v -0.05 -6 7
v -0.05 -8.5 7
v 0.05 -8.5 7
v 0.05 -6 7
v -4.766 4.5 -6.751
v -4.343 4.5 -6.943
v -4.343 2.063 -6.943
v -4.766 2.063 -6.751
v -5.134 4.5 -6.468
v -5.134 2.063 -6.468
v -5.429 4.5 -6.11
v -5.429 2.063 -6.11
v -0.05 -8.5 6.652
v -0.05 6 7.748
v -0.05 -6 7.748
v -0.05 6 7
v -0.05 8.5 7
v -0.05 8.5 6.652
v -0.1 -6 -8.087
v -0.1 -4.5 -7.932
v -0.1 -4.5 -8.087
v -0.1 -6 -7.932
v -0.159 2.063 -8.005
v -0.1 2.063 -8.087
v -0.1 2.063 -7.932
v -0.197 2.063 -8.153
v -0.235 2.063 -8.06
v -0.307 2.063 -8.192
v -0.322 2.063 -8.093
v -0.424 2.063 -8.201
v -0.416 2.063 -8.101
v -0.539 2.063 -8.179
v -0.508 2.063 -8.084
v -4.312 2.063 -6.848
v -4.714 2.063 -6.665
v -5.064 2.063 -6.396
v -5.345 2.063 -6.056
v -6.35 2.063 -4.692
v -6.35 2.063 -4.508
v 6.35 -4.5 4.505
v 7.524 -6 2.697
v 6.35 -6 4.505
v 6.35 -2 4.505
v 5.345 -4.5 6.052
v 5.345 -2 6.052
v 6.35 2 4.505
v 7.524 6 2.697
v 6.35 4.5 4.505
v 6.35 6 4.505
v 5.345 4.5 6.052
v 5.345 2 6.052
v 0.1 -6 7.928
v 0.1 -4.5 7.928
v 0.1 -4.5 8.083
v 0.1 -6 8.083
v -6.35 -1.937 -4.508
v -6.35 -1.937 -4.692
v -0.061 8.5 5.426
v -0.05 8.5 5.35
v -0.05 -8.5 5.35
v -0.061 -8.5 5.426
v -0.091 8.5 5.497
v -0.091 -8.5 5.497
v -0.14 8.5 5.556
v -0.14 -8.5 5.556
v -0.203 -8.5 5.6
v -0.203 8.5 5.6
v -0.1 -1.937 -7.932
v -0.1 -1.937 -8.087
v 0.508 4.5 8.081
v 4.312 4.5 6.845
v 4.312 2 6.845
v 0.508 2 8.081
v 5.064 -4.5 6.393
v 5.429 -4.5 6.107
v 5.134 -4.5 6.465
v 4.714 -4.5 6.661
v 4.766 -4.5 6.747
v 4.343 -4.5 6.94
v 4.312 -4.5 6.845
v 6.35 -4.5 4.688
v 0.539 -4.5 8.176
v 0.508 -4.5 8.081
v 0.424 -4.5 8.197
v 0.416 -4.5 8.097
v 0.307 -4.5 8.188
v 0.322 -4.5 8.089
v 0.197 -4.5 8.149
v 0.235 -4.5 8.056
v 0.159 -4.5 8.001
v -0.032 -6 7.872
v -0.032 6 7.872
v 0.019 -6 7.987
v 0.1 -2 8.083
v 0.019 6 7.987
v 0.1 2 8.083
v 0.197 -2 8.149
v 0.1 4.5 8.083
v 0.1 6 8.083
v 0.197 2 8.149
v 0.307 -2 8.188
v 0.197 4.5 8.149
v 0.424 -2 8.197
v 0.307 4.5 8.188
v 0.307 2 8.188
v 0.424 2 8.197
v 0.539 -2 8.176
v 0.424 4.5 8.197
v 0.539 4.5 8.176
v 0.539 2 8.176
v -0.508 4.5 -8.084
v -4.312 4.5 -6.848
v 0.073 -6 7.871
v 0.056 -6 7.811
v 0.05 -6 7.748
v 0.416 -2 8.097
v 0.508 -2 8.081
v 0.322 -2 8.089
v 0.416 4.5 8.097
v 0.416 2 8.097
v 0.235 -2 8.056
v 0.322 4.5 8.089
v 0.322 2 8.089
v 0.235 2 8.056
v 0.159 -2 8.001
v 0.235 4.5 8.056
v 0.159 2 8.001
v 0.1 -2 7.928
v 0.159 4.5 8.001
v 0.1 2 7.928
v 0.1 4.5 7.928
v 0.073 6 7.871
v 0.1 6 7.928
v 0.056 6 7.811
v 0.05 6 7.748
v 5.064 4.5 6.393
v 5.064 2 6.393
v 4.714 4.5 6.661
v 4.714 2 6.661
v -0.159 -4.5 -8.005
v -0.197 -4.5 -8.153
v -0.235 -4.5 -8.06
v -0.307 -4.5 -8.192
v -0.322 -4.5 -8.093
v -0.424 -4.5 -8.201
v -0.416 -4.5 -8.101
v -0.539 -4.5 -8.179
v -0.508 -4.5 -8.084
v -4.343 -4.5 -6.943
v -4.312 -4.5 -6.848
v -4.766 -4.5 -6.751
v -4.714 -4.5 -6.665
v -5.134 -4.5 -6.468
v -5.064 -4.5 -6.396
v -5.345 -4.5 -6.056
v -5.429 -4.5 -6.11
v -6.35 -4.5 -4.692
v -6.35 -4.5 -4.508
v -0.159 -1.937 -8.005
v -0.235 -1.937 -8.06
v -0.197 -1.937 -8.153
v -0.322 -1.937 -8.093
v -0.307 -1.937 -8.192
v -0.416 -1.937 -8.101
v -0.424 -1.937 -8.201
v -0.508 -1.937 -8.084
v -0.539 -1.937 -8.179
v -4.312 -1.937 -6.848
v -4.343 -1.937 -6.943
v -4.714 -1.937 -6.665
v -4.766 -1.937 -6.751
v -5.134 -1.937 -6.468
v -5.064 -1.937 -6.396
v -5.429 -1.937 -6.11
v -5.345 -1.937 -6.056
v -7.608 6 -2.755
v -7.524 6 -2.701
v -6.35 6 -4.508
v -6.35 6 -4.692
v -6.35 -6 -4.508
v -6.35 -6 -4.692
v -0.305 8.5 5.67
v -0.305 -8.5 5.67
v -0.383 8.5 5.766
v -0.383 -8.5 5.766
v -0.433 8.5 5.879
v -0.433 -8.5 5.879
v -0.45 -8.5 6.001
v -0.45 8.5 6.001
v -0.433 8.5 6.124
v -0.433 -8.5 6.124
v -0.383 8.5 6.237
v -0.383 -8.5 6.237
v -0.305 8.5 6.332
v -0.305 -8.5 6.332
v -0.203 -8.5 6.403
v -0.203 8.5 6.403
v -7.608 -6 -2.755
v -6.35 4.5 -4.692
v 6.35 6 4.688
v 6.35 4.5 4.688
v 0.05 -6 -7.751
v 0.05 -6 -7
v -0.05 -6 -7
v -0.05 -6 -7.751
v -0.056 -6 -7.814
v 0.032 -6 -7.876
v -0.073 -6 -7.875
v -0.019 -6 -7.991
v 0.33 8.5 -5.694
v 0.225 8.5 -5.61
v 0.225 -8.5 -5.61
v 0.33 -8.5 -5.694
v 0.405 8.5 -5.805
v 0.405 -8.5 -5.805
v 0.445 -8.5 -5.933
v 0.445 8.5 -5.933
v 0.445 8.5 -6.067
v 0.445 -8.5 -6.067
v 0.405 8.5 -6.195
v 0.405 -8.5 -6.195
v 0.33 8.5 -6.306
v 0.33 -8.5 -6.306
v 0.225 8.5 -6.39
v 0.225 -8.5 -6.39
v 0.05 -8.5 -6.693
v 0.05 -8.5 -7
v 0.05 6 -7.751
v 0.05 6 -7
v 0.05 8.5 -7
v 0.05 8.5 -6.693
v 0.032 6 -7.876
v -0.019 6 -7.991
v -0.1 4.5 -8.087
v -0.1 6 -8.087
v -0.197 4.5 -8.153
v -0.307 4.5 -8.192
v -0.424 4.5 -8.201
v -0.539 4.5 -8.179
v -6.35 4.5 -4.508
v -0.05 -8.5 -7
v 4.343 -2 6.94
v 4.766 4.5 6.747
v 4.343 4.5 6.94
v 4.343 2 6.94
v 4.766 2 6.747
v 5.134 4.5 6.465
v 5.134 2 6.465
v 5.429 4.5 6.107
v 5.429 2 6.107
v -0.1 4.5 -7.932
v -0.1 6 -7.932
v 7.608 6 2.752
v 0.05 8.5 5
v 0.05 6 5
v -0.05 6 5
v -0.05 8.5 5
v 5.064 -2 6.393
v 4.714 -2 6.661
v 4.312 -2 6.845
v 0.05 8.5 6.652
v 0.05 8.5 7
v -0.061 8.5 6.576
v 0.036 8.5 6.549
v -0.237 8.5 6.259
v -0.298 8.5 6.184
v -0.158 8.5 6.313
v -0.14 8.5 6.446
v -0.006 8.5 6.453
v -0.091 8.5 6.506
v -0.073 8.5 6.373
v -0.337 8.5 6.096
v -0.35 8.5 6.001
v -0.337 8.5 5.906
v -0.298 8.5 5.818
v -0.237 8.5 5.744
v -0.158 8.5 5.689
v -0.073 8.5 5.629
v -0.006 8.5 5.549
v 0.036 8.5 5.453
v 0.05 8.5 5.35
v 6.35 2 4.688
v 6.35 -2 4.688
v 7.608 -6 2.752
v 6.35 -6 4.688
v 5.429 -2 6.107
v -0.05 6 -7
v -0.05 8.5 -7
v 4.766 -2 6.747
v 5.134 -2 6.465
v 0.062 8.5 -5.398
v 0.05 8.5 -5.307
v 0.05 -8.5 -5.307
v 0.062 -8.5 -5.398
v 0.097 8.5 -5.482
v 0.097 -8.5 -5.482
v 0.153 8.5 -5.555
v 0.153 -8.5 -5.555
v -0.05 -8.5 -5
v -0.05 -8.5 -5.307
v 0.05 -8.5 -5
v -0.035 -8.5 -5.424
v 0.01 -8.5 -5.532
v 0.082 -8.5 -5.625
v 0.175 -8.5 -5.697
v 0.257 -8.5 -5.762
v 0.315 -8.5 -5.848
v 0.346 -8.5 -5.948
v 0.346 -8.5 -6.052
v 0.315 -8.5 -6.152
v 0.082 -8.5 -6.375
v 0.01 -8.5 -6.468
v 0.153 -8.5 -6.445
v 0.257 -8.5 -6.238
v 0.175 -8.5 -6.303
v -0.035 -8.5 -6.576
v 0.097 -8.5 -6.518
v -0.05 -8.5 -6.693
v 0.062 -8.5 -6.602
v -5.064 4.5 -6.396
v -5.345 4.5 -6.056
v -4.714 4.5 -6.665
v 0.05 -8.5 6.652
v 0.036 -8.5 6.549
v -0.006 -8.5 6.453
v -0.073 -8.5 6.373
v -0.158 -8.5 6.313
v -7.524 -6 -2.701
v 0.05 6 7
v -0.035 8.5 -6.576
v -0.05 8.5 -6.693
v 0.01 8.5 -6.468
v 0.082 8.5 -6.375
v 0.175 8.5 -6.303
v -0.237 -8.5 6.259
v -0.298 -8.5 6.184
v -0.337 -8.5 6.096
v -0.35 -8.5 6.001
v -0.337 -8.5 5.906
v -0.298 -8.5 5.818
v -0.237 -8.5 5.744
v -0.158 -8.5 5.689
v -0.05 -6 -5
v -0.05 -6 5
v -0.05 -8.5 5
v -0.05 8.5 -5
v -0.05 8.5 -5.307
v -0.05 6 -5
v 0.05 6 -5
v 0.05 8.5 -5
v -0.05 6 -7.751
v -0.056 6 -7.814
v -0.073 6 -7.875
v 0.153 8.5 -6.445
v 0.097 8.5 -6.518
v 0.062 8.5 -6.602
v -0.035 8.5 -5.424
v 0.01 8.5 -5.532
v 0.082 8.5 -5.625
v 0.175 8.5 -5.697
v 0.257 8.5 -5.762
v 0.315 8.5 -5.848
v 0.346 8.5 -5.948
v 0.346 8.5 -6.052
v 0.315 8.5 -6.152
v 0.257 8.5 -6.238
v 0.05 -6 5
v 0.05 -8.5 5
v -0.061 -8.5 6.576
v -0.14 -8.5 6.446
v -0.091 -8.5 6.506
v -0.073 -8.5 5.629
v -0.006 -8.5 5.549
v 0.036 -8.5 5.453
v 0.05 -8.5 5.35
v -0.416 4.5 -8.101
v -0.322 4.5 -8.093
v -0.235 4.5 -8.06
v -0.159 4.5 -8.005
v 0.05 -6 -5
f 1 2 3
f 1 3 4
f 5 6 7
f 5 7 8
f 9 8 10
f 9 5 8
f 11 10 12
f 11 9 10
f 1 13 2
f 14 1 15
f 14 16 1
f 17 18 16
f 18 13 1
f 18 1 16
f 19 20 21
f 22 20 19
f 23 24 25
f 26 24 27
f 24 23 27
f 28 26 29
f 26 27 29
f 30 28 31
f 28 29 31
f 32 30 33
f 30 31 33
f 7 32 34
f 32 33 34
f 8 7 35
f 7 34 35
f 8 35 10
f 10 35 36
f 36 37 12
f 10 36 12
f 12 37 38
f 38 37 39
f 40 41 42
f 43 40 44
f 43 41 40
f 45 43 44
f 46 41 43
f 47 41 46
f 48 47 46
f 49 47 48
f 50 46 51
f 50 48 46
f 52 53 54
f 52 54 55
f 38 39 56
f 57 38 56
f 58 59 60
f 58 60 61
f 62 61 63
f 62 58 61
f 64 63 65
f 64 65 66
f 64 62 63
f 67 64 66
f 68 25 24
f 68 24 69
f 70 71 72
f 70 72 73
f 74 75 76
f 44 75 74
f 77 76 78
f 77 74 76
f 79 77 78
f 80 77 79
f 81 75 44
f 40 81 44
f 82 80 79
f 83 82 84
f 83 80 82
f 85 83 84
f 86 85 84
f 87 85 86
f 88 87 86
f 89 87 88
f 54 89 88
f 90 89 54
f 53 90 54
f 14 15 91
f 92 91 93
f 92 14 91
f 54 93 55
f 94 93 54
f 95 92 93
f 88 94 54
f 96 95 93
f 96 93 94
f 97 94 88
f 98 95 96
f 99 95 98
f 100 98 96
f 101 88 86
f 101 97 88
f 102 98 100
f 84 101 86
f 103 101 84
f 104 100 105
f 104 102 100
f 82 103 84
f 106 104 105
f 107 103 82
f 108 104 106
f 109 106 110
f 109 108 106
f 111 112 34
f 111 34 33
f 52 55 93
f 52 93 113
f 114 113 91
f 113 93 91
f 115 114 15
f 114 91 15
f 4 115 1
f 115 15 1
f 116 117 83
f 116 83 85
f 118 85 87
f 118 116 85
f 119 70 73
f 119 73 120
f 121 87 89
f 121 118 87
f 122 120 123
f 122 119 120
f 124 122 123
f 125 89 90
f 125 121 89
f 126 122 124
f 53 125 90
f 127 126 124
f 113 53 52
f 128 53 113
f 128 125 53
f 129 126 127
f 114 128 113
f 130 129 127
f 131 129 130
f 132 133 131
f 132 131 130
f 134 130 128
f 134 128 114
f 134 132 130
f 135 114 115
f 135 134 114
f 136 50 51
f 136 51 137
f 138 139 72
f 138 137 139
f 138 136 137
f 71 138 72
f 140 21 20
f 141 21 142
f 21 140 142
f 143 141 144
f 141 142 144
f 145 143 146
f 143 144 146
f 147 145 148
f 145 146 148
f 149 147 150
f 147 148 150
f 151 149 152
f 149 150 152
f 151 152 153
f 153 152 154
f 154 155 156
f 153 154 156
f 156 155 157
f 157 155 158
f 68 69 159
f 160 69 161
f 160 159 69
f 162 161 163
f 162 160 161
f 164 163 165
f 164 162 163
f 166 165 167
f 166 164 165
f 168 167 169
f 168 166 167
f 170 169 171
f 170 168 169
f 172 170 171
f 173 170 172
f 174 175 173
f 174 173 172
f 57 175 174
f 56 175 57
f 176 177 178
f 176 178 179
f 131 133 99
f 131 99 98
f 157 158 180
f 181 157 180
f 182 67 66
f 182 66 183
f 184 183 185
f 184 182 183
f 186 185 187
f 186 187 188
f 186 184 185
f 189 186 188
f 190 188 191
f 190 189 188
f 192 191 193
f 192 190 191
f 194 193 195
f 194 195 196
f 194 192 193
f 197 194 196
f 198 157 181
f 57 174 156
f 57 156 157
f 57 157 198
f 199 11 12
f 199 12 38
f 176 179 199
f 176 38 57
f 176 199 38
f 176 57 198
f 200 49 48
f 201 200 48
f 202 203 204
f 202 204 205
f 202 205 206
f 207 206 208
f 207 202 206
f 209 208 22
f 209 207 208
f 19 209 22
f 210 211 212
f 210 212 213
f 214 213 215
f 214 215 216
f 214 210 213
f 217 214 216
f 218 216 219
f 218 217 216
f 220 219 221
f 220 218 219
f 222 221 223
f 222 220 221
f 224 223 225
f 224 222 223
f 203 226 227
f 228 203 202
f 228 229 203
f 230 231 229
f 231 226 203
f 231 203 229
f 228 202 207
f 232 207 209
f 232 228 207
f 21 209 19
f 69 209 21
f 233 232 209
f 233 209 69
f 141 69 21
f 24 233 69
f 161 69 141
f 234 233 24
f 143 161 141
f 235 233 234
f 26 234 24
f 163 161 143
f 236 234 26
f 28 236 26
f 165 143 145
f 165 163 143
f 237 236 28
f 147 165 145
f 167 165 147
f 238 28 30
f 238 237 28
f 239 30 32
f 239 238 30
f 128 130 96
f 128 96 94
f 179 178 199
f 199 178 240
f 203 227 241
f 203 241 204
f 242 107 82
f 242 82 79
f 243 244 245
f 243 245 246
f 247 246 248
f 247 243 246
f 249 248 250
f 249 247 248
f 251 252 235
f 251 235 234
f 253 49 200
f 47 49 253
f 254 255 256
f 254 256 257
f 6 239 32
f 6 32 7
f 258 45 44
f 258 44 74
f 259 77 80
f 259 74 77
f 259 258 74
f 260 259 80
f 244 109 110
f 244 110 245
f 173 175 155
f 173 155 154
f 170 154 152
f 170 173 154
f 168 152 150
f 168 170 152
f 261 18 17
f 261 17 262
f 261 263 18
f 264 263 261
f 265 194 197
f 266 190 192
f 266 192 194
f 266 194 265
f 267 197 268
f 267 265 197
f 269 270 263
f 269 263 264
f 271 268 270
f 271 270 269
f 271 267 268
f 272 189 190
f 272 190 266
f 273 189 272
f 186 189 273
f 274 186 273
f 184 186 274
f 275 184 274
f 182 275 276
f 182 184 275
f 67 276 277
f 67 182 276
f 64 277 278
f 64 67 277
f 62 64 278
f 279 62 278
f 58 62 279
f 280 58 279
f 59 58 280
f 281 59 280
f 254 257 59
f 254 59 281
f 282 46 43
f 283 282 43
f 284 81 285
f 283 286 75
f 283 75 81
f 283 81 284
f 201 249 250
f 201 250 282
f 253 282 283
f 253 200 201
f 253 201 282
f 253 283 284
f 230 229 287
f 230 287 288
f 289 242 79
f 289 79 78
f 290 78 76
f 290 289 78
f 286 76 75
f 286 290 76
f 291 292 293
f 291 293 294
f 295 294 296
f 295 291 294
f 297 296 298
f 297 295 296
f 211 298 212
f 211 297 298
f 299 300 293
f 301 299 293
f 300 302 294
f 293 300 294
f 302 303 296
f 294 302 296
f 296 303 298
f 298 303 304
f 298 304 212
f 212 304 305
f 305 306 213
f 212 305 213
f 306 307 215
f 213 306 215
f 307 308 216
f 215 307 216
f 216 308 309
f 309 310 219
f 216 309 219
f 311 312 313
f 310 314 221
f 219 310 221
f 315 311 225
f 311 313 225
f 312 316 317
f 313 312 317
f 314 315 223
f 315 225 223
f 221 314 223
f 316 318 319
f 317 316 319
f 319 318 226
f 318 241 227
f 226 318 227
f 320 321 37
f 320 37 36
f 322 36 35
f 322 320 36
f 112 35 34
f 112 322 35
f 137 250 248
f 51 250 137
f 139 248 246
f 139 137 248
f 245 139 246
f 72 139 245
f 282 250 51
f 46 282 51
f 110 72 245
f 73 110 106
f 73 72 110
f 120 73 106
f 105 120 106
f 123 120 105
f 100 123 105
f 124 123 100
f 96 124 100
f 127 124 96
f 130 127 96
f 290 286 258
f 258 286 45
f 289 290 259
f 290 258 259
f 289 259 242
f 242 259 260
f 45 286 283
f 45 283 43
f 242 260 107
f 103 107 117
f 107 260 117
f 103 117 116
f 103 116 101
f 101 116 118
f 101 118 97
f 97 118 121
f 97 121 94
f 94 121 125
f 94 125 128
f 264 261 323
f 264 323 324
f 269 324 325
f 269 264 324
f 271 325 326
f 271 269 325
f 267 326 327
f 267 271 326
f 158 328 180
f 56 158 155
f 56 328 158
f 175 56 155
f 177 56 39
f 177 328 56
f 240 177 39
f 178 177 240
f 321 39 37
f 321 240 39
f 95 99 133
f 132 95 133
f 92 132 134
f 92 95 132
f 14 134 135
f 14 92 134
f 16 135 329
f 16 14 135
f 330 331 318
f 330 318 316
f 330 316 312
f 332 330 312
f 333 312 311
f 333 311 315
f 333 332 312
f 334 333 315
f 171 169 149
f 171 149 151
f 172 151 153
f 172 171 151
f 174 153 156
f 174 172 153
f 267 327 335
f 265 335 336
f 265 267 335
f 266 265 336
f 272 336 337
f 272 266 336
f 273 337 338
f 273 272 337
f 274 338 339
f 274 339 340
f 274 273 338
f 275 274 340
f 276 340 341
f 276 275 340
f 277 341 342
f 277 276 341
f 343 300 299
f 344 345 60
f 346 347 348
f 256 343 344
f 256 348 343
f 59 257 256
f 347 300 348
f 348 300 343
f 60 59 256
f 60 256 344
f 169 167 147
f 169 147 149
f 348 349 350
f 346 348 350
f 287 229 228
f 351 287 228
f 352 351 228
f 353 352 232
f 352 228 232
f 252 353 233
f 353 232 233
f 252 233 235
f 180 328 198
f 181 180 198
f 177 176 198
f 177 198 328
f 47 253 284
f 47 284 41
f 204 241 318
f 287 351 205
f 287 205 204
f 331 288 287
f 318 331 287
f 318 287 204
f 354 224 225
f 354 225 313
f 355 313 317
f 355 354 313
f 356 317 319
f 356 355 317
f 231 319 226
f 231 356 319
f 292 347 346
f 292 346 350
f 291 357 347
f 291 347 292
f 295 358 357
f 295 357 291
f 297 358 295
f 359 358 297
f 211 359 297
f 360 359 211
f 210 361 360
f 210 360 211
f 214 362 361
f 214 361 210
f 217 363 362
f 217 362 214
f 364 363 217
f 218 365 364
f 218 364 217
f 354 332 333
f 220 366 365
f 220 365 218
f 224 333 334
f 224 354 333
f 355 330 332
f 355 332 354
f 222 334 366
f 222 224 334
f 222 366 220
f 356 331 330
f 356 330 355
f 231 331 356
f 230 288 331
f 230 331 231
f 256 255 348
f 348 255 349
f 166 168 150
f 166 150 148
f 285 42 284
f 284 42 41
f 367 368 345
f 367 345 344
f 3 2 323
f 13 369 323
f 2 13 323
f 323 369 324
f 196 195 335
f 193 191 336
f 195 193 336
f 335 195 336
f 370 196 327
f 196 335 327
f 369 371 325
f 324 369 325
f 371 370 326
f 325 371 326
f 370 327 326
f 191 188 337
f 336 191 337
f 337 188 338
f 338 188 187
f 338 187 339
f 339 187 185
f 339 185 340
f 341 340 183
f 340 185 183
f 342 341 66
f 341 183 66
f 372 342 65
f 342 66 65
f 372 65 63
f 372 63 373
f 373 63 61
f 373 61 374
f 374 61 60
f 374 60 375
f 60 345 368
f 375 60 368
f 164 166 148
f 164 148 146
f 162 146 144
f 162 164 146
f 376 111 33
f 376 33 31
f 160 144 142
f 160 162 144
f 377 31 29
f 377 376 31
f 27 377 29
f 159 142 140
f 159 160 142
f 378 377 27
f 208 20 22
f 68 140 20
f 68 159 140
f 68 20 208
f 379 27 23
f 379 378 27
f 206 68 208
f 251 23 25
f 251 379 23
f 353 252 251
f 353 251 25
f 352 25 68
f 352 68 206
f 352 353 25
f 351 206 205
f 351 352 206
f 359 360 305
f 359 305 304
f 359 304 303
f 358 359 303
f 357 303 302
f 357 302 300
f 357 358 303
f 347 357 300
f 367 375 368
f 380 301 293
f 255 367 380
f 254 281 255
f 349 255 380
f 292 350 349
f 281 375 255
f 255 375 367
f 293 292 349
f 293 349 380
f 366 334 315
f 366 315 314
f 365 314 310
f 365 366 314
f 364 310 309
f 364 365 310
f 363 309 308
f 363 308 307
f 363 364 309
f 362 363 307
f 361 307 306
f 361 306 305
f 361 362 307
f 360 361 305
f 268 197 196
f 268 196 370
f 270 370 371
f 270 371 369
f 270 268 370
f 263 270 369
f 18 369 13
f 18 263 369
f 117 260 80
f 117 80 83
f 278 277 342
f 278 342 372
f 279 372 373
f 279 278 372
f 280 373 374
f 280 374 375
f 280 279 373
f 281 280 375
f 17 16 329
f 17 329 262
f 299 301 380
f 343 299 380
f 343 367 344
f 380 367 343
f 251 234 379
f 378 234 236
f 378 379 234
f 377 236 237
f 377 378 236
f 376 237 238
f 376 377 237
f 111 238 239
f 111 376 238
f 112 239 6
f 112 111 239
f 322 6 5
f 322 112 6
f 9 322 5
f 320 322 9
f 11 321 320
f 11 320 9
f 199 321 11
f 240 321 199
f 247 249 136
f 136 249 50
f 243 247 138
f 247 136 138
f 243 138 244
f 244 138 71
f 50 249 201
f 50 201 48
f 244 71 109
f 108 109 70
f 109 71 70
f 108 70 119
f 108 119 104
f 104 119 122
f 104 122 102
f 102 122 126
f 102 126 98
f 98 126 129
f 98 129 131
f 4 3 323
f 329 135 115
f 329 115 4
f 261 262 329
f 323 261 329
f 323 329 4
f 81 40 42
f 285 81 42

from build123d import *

# Parameters (mm, degrees)
EXTRUDE_THIN1_DEPTH      = 8.5
EXTRUDE_THIN1_DEPTH_BACK = 8.5
SKETCH2_W                = 10
SKETCH2_H                = 2.5
SKETCH2_W_2              = 2.5
EXTRUDE1_DEPTH           = 10
EXTRUDE1_DEPTH_BACK      = 10
SKETCH3_W                = 6.25
SKETCH3_H                = 4
EXTRUDE2_DEPTH           = 10
SKETCH4_W                = 6.25
SKETCH4_H                = 4
EXTRUDE3_DEPTH           = 10


with BuildPart() as part:
    # Sketch1 → Extrude-Thin1 (new body, two sides)
    with BuildSketch(Plane(origin=(0, 0, 0), x_dir=(1, 0, 0), z_dir=(0, 1, 0))) as extrude_thin1_sk:
        with BuildLine():
            Line((7.523762622, -2.697363846), (5.345206482, -6.052046118))
            ThreePointArc((5.345206482, -6.052046118), (4.896883661, -6.537039014), (4.312382013, -6.844560207))
            Line((4.312382013, -6.844560207), (0.508155948, -8.080628184))
            ThreePointArc((0.508155948, -8.080628184), (0.194275162, -8.030914352), (0.05, -7.747758404))
            Line((0.05, -7.747758404), (0.05, -6.652305648))
            ThreePointArc((0.05, -6.652305648), (-0.006212483, -6.453404557), (-0.158219178, -6.313349383))
            ThreePointArc((-0.158219178, -6.313349383), (-0.35, -6.001152824), (-0.158219178, -5.688956264))
            ThreePointArc((-0.158219178, -5.688956264), (-0.006212483, -5.548901091), (0.05, -5.35))
            Line((0.05, -5.35), (0.05, 5.307179677))
            ThreePointArc((0.05, 5.307179677), (0.096891109, 5.482179677), (0.225, 5.610288568))
            ThreePointArc((0.225, 5.610288568), (0.45, 6), (0.225, 6.389711432))
            ThreePointArc((0.225, 6.389711432), (0.096891109, 6.517820323), (0.05, 6.692820323))
            Line((0.05, 6.692820323), (0.05, 7.751254615))
            ThreePointArc((0.05, 7.751254615), (-0.135496636, 8.115312262), (-0.539057647, 8.179230047))
            Line((-0.539057647, 8.179230047), (-4.343283713, 6.943162069))
            ThreePointArc((-4.343283713, 6.943162069), (-4.957759804, 6.619870559), (-5.429073538, 6.110006233))
            Line((-5.429073538, 6.110006233), (-7.607629679, 2.755323961))
            Line((-7.607629679, 2.755323961), (-7.523762622, 2.700860058))
            Line((-7.523762622, 2.700860058), (-5.345206482, 6.055542329))
            ThreePointArc((-5.345206482, 6.055542329), (-4.896883661, 6.540535225), (-4.312382013, 6.848056418))
            Line((-4.312382013, 6.848056418), (-0.508155948, 8.084124395))
            ThreePointArc((-0.508155948, 8.084124395), (-0.194275162, 8.034410563), (-0.05, 7.751254615))
            Line((-0.05, 7.751254615), (-0.05, 6.692820323))
            ThreePointArc((-0.05, 6.692820323), (0.010288568, 6.467820323), (0.175, 6.303108891))
            ThreePointArc((0.175, 6.303108891), (0.35, 6), (0.175, 5.696891109))
            ThreePointArc((0.175, 5.696891109), (0.010288568, 5.532179677), (-0.05, 5.307179677))
            Line((-0.05, 5.307179677), (-0.05, -5.35))
            ThreePointArc((-0.05, -5.35), (-0.091419724, -5.496558698), (-0.203424658, -5.599757248))
            ThreePointArc((-0.203424658, -5.599757248), (-0.45, -6.001152824), (-0.203424658, -6.4025484))
            ThreePointArc((-0.203424658, -6.4025484), (-0.091419724, -6.505746949), (-0.05, -6.652305648))
            Line((-0.05, -6.652305648), (-0.05, -7.747758404))
            ThreePointArc((-0.05, -7.747758404), (0.135496636, -8.111816051), (0.539057647, -8.175733836))
            Line((0.539057647, -8.175733836), (4.343283713, -6.939665858))
            ThreePointArc((4.343283713, -6.939665858), (4.957759804, -6.616374348), (5.429073538, -6.106510022))
            Line((5.429073538, -6.106510022), (7.607629679, -2.75182775))
            Line((7.607629679, -2.75182775), (7.523762622, -2.697363846))
        make_face()
    extrude(amount=EXTRUDE_THIN1_DEPTH)
    extrude(extrude_thin1_sk.sketch, amount=-EXTRUDE_THIN1_DEPTH_BACK)

    # Sketch2 → Extrude1 (cut, two sides)
    with BuildSketch(Plane(origin=(0, 0, 0), x_dir=(0, 0, -1), z_dir=(1, 0, 0))) as extrude1_sk:
        with Locations((0, 7.25)):
            Rectangle(SKETCH2_W, SKETCH2_H)
        with Locations((0, -7.25)):
            Rectangle(SKETCH2_W, SKETCH2_H)
        with Locations((8.25, 7.25)):
            Rectangle(SKETCH2_W_2, SKETCH2_H)
        with Locations((-8.25, 7.25)):
            Rectangle(SKETCH2_W_2, SKETCH2_H)
        with Locations((8.25, -7.25)):
            Rectangle(SKETCH2_W_2, SKETCH2_H)
        with Locations((-8.25, -7.25)):
            Rectangle(SKETCH2_W_2, SKETCH2_H)
    extrude(amount=EXTRUDE1_DEPTH, mode=Mode.SUBTRACT)
    extrude(extrude1_sk.sketch, amount=-EXTRUDE1_DEPTH_BACK, mode=Mode.SUBTRACT)

    # Sketch3 → Extrude2 (cut)
    with BuildSketch(Plane(origin=(0, 0, 0), x_dir=(-1, 0, 0), z_dir=(0, 0, 1))):
        with Locations((-3.225, -6.5)):
            Rectangle(SKETCH3_W, SKETCH3_H)
        with Locations((-3.225, 0)):
            Rectangle(SKETCH3_W, SKETCH3_H)
        with Locations((-3.225, 6.5)):
            Rectangle(SKETCH3_W, SKETCH3_H)
    extrude(amount=EXTRUDE2_DEPTH, mode=Mode.SUBTRACT)

    # Sketch4 → Extrude3 (cut)
    with BuildSketch(Plane(origin=(0, 0, 0), x_dir=(-1, 0, 0), z_dir=(0, 0, 1))):
        with Locations((3.225, 6.5)):
            Rectangle(SKETCH4_W, SKETCH4_H)
        with Locations((3.225, -0.062819576)):
            Rectangle(SKETCH4_W, SKETCH4_H)
        with Locations((3.225, -6.5)):
            Rectangle(SKETCH4_W, SKETCH4_H)
    extrude(amount=-EXTRUDE3_DEPTH, mode=Mode.SUBTRACT)


solid = part.part
